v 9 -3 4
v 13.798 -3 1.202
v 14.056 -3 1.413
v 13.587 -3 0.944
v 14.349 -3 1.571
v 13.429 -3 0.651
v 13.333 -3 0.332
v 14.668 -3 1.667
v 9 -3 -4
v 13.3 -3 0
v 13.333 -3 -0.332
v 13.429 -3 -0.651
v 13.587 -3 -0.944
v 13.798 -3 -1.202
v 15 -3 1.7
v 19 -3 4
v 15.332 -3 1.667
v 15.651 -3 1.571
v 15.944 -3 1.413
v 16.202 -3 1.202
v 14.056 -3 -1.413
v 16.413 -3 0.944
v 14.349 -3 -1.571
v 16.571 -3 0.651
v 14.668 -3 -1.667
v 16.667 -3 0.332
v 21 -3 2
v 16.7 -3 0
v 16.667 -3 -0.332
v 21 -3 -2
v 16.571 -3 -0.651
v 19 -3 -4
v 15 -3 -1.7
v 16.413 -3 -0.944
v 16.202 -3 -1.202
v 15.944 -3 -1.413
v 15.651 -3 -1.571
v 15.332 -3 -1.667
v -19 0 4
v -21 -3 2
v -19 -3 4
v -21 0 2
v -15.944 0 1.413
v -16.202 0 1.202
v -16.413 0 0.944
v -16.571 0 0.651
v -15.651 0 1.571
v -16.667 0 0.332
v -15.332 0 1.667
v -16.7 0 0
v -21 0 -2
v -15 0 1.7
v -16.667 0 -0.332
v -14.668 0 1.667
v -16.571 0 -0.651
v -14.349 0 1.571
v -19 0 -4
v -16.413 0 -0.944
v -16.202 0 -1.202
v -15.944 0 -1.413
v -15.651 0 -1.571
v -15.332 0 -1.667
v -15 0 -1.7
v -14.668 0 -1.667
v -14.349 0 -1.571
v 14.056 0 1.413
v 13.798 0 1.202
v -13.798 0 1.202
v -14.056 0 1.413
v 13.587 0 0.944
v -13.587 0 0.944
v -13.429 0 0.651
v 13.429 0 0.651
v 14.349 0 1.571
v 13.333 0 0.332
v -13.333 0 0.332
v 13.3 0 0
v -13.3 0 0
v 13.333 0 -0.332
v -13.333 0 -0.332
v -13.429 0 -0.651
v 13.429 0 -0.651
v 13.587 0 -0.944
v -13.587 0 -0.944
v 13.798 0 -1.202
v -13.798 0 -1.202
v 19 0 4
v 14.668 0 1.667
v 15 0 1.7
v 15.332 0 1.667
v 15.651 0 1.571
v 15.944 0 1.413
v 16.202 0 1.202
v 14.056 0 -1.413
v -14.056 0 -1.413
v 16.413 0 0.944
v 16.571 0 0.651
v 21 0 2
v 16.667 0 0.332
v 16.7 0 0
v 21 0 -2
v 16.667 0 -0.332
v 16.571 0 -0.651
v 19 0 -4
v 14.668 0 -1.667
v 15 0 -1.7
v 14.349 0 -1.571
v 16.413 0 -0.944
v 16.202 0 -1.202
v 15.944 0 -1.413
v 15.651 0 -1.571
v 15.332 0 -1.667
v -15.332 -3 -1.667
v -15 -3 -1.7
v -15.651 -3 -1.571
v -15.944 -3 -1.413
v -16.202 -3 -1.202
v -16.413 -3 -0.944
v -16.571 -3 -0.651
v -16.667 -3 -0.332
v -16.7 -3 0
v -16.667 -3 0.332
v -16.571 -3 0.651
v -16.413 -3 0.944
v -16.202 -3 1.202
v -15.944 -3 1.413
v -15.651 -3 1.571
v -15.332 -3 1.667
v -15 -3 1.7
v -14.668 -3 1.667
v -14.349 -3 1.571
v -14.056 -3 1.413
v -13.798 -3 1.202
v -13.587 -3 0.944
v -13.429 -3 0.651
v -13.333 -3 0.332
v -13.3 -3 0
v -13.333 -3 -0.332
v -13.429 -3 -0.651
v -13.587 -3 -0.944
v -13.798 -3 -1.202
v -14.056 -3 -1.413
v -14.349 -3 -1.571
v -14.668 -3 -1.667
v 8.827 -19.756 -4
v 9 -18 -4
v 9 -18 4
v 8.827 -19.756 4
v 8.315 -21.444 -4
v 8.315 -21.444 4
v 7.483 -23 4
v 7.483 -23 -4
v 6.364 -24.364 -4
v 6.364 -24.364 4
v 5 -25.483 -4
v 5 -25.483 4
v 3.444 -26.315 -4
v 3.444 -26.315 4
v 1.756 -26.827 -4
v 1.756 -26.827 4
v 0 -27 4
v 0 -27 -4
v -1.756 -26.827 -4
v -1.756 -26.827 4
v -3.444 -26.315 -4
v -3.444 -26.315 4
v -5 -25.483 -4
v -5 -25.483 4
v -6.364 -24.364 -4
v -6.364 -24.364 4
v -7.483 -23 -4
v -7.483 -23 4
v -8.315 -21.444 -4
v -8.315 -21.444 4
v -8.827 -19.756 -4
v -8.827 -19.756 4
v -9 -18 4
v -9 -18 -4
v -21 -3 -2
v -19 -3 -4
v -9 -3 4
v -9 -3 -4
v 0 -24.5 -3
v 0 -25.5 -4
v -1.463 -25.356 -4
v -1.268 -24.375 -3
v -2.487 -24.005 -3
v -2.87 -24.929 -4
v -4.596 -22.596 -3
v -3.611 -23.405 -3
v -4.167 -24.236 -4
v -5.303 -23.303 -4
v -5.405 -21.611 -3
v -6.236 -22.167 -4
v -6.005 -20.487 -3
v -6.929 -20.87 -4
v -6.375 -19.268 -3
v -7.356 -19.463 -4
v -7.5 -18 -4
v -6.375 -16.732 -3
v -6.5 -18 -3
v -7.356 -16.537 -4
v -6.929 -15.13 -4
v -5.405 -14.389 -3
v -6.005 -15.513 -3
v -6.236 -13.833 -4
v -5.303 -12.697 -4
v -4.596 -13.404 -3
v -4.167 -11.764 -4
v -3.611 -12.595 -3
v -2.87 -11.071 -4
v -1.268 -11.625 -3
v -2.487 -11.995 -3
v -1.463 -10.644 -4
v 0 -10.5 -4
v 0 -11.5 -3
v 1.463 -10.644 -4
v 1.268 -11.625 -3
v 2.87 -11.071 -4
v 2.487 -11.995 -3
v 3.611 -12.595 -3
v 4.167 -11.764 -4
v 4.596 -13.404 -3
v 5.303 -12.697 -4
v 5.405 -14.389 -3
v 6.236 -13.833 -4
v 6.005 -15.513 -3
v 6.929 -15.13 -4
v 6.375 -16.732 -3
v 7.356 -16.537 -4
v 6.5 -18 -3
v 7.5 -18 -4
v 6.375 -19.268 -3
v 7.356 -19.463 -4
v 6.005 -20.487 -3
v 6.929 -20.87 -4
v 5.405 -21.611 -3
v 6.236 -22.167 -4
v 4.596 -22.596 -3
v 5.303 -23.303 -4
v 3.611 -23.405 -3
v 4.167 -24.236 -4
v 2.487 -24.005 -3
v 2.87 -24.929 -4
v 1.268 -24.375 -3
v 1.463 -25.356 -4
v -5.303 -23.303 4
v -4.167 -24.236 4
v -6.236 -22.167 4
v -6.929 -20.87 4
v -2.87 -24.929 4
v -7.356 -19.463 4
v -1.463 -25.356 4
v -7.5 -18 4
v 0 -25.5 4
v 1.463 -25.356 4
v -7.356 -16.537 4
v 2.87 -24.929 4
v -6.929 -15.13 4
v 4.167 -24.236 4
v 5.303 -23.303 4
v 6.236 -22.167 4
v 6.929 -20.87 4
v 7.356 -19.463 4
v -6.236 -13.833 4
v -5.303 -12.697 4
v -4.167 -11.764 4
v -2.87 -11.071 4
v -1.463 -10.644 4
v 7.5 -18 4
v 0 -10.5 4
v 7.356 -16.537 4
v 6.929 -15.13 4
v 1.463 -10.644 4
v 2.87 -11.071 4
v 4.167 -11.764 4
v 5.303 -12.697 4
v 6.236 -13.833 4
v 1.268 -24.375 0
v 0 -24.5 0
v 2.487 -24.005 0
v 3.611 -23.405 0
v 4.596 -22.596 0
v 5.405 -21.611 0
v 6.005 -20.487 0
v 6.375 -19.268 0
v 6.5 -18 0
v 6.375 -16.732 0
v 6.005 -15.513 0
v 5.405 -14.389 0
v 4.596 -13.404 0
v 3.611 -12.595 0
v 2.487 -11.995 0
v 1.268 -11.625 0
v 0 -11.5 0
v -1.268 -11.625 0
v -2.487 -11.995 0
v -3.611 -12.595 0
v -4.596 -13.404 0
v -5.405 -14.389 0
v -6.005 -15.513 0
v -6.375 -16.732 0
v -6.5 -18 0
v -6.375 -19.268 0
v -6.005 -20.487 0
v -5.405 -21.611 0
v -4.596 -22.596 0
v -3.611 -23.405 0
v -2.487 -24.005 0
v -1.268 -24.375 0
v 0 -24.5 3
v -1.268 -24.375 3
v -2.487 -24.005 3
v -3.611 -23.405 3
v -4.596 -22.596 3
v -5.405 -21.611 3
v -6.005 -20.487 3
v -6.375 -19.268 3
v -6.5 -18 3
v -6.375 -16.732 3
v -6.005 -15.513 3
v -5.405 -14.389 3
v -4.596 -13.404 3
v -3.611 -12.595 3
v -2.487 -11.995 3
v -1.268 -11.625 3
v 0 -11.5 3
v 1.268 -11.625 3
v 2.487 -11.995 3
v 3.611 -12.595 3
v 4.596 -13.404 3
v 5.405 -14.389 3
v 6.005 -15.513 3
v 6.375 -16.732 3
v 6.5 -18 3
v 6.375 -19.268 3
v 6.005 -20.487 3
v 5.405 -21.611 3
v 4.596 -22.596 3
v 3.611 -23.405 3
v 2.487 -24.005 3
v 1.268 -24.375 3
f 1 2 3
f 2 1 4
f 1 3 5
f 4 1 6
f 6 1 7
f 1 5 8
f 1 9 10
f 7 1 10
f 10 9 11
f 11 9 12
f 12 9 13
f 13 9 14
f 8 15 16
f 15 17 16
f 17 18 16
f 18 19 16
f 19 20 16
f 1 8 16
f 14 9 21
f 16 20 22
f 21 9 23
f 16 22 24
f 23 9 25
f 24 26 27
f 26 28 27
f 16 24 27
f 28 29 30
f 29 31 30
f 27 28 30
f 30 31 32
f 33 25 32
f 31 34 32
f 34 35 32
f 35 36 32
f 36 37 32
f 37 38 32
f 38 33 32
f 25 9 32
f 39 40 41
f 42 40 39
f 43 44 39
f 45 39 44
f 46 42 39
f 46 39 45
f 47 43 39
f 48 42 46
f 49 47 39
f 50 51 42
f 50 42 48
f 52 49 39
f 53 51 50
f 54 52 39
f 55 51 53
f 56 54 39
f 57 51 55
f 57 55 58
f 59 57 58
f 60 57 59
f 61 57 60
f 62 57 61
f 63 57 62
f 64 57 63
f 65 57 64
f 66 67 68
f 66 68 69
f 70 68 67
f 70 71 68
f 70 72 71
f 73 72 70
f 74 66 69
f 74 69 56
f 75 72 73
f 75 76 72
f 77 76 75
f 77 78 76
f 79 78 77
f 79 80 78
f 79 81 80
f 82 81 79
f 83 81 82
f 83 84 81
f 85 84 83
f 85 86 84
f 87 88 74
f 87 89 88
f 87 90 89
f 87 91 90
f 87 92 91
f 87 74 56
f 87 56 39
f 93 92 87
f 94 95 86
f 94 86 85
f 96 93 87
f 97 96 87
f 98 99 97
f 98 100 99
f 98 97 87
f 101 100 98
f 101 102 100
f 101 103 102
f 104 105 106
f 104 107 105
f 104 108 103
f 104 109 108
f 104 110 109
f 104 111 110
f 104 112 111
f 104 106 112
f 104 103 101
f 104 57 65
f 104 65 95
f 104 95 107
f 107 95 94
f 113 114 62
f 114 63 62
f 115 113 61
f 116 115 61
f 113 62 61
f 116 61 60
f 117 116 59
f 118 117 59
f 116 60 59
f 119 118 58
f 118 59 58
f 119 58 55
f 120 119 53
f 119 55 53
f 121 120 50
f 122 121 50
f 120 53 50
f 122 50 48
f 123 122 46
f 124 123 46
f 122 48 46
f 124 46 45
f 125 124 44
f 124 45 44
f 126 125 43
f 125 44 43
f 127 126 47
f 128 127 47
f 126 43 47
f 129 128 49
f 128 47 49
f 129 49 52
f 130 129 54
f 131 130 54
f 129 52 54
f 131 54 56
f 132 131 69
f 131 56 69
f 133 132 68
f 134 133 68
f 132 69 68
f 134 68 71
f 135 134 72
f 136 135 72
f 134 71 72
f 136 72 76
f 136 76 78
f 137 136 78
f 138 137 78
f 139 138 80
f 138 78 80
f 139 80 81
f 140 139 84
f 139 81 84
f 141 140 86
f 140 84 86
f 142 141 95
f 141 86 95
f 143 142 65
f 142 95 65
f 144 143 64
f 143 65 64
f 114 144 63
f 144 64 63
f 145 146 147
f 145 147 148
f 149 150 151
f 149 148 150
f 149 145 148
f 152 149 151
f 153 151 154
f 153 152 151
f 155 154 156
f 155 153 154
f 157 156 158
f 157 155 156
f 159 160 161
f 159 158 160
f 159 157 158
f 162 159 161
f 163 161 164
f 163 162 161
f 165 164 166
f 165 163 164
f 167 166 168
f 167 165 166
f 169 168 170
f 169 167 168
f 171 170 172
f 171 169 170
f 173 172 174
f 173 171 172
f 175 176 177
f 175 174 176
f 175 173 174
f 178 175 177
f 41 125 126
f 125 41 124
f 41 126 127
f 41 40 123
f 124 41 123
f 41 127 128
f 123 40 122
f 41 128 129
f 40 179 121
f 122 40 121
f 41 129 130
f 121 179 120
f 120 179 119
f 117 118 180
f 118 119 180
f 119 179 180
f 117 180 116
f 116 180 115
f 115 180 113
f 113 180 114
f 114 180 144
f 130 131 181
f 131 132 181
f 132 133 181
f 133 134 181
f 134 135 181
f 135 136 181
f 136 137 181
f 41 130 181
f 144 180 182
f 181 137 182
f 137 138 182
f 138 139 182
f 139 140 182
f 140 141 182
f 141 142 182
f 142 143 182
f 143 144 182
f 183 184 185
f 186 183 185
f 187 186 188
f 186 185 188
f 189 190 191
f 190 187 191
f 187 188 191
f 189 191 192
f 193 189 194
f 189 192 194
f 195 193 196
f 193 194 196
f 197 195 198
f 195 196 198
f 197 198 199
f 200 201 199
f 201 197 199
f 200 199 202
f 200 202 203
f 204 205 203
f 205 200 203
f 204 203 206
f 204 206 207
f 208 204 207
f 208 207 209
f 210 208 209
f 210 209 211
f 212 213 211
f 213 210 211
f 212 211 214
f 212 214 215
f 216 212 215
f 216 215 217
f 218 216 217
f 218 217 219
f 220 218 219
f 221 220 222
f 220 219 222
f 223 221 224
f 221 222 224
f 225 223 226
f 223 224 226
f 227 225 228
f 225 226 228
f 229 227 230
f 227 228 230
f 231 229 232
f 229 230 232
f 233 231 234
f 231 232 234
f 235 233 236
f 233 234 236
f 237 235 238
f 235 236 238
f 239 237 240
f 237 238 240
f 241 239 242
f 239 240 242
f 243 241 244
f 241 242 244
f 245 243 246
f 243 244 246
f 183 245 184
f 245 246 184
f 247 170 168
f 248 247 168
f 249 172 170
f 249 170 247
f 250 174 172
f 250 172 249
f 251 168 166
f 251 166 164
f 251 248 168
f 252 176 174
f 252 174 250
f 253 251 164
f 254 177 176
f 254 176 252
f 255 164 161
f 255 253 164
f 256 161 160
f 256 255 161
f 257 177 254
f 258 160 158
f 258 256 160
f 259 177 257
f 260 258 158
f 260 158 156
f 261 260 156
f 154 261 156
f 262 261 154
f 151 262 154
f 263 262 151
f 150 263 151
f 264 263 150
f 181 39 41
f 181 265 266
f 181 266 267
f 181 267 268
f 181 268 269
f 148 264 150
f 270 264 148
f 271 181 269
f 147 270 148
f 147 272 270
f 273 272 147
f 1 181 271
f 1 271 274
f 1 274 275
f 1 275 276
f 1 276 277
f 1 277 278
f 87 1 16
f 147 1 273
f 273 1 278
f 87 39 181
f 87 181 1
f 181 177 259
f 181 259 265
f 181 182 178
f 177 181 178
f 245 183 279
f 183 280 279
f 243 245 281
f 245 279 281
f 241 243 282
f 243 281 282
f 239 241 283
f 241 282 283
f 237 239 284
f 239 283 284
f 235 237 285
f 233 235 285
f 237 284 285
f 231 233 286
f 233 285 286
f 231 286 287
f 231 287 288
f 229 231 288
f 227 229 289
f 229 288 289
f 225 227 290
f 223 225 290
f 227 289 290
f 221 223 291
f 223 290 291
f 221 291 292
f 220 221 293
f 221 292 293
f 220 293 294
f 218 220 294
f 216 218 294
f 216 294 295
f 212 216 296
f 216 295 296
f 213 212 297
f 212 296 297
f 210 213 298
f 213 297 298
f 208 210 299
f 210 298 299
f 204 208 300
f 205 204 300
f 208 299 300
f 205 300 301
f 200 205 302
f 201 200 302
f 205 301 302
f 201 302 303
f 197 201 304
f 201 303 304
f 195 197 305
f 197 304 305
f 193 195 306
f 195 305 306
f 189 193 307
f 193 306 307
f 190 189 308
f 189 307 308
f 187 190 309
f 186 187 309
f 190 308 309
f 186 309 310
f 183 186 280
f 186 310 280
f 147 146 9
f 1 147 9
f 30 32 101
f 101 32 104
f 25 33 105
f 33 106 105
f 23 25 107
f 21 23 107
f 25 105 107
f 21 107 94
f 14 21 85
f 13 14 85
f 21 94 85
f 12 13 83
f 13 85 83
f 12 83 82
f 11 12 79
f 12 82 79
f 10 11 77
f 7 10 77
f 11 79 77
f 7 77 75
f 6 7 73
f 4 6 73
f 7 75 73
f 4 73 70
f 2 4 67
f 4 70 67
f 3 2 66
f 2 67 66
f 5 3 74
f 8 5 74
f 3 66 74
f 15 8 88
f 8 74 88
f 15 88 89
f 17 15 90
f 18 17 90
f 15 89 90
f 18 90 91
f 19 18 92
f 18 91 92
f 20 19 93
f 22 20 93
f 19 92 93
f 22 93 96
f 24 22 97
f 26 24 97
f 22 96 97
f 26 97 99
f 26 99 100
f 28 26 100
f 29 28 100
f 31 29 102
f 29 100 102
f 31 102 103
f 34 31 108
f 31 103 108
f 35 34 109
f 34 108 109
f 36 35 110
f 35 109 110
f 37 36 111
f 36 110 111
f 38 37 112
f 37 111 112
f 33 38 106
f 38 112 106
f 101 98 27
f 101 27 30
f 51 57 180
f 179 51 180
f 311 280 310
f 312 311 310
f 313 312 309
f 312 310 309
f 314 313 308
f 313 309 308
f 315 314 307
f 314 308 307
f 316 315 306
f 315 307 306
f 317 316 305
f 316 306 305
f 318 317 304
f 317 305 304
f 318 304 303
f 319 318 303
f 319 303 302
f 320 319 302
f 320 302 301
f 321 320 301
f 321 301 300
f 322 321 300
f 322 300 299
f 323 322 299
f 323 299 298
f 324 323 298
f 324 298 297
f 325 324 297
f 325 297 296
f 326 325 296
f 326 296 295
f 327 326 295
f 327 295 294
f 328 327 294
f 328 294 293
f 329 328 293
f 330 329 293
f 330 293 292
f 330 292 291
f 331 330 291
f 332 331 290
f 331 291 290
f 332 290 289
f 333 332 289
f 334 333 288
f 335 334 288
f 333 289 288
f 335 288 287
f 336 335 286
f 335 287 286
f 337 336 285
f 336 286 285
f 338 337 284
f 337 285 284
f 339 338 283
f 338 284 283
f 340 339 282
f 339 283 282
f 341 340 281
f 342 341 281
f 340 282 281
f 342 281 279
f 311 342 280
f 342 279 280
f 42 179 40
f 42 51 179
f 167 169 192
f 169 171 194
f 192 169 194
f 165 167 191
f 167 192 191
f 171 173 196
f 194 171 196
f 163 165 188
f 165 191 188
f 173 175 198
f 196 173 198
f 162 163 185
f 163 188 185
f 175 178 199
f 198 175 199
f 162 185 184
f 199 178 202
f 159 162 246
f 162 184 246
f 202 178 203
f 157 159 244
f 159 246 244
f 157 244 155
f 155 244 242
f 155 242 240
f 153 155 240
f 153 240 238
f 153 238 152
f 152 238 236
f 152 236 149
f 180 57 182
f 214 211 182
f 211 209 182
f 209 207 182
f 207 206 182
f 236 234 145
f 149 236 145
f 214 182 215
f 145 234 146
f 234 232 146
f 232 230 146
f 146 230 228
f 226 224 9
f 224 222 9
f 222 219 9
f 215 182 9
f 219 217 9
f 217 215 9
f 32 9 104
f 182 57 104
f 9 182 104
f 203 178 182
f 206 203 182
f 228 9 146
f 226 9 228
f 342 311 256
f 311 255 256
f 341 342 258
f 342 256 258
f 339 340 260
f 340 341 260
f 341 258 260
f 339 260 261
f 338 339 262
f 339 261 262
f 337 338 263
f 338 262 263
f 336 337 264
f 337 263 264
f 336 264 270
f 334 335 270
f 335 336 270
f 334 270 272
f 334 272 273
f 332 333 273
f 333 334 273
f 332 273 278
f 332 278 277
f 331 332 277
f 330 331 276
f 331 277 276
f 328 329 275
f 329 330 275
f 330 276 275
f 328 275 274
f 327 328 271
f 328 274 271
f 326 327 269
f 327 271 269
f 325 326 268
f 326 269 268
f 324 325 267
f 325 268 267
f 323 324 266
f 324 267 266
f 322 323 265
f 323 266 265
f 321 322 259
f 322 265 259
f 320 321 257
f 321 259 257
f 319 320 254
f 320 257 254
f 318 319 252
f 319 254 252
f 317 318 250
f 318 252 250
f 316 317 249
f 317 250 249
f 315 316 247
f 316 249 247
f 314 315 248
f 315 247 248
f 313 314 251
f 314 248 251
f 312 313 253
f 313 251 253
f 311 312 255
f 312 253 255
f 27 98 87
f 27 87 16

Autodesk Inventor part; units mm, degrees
ref_plane "YZ Plane" through (0, 0, 0) normal (1, 0, 0) x (0, 1, 0)
ref_plane "XZ Plane" through (0, 0, 0) normal (0, 1, 0) x (-1, 0, 0)
ref_plane "XY Plane" through (0, 0, 0) normal (0, 0, 1) x (1, 0, 0)
sketch "Sketch2" plane through (0, 0, 0) normal (0, 0, 1) x (1, 0, 0)
  line L0 (0, 0) -> (0, -18) construction
  line L1 (-9, 0) -> (-9, -18)
  line L2 (9, -18) -> (9, 0)
  arc A0 (9, 0) -> (-9, 0) centre (0, 0) ccw construction
  arc A1 (-9, -18) -> (9, -18) centre (0, -18) ccw
  arc A2 (6.5, -18) -> (-6.5, -18) centre (0, -18) ccw
  circle A3 centre (0, -18) radius 5 construction
  line L3 (-9, 0) -> (9, 0)
  line L4 (9, -18) -> (6.5, -18)
  arc A4 (-6.5, -18) -> (0, -24.5) centre (0, -18) ccw
  arc A5 (0, -24.5) -> (6.5, -18) centre (0, -18) ccw
  line L5 (-6.5, -18) -> (-9, -18)
  line L6 (6.5, -18) -> (-6.5, -18) construction
  line L7 (9, -18) -> (6.5, -18)
  line L8 (-9, -18) -> (-6.5, -18)
  point P0 (0, -9)
  dimension "d2" = 2.5
  dimension "d3" = 10
  dimension "d4" = 1.5
  dimension "d5" = 18
extrude "Extrusion1" add sketch "Sketch2" along normal mid plane 8 contours L3 L2 L4 A2 L5 L1 | L5 A4 A5 L4 A1
sketch "Sketch3" plane through (-9, 0, 4) normal (0, 1, 0) x (1, 0, 0)
  line L0 (-12, 0) -> (30, 0)
  line L1 (30, 0) -> (30, 8)
  line L2 (30, 8) -> (-12, 8)
  line L3 (-12, 8) -> (-12, 0)
  line L4 (-12, 0) -> (30, 8) construction
  line L5 (30, 0) -> (-12, 8) construction
  line L6 (0, 8) -> (18, 8) projected
  line L7 (0, 8) -> (0, 0) projected
  point P0 (9, 4)
  dimension "d8" = 12
extrude "Extrusion2" add sketch "Sketch3" against normal blind 3
sketch "Sketch4" plane through (-9, -3, 4) normal (0, -1, 0) x (1, 0, 0)
  line L0 (18, -8) -> (0, -8) construction
  line L1 (-12, 0) -> (0, 0) construction
  line L2 (-12, -8) -> (-12, 0) construction
  line L3 (0, 0) -> (18, 0) construction
  line L4 (30, 0) -> (30, -8) construction
  line L5 (30, -8) -> (18, -8) construction
  line L6 (0, -8) -> (0, 0) construction
  line L7 (0, -8) -> (-12, -8) construction
  line L8 (18, 0) -> (30, 0) construction
  line L9 (18, 0) -> (18, -8) construction
  line L10 (0, 0) -> (0, -8) projected
  line L11 (0, 0) -> (-12, 0) projected
  line L12 (-12, 0) -> (-12, -8) projected
  line L13 (-12, -8) -> (0, -8) projected
  line L14 (18, -8) -> (18, 0) projected
  line L15 (18, -8) -> (30, -8) projected
  line L16 (30, -8) -> (30, 0) projected
  line L17 (30, 0) -> (18, 0) projected
  point P0 (-6, -4)
  point P1 (24, -4)
  point P2 (24, 0)
  point P3 (-6, 0)
  point P4 (30, -4)
  point P5 (30, -4)
hole "Hole1" at (-15, -3, 0) at (15, -3, 0) direction (0, 1, 0) diameter 3.4 end through all
chamfer "Chamfer2" distance 1 angle 45 2 edges at (0, -11.5, -4) (0, -11.5, 4)
chamfer "Chamfer3" distance 2 angle 45 4 edges at (-21, -1.5, -4) (-21, -1.5, 4) (21, -1.5, -4) (21, -1.5, 4)
properties part number "driver gear stopper"
